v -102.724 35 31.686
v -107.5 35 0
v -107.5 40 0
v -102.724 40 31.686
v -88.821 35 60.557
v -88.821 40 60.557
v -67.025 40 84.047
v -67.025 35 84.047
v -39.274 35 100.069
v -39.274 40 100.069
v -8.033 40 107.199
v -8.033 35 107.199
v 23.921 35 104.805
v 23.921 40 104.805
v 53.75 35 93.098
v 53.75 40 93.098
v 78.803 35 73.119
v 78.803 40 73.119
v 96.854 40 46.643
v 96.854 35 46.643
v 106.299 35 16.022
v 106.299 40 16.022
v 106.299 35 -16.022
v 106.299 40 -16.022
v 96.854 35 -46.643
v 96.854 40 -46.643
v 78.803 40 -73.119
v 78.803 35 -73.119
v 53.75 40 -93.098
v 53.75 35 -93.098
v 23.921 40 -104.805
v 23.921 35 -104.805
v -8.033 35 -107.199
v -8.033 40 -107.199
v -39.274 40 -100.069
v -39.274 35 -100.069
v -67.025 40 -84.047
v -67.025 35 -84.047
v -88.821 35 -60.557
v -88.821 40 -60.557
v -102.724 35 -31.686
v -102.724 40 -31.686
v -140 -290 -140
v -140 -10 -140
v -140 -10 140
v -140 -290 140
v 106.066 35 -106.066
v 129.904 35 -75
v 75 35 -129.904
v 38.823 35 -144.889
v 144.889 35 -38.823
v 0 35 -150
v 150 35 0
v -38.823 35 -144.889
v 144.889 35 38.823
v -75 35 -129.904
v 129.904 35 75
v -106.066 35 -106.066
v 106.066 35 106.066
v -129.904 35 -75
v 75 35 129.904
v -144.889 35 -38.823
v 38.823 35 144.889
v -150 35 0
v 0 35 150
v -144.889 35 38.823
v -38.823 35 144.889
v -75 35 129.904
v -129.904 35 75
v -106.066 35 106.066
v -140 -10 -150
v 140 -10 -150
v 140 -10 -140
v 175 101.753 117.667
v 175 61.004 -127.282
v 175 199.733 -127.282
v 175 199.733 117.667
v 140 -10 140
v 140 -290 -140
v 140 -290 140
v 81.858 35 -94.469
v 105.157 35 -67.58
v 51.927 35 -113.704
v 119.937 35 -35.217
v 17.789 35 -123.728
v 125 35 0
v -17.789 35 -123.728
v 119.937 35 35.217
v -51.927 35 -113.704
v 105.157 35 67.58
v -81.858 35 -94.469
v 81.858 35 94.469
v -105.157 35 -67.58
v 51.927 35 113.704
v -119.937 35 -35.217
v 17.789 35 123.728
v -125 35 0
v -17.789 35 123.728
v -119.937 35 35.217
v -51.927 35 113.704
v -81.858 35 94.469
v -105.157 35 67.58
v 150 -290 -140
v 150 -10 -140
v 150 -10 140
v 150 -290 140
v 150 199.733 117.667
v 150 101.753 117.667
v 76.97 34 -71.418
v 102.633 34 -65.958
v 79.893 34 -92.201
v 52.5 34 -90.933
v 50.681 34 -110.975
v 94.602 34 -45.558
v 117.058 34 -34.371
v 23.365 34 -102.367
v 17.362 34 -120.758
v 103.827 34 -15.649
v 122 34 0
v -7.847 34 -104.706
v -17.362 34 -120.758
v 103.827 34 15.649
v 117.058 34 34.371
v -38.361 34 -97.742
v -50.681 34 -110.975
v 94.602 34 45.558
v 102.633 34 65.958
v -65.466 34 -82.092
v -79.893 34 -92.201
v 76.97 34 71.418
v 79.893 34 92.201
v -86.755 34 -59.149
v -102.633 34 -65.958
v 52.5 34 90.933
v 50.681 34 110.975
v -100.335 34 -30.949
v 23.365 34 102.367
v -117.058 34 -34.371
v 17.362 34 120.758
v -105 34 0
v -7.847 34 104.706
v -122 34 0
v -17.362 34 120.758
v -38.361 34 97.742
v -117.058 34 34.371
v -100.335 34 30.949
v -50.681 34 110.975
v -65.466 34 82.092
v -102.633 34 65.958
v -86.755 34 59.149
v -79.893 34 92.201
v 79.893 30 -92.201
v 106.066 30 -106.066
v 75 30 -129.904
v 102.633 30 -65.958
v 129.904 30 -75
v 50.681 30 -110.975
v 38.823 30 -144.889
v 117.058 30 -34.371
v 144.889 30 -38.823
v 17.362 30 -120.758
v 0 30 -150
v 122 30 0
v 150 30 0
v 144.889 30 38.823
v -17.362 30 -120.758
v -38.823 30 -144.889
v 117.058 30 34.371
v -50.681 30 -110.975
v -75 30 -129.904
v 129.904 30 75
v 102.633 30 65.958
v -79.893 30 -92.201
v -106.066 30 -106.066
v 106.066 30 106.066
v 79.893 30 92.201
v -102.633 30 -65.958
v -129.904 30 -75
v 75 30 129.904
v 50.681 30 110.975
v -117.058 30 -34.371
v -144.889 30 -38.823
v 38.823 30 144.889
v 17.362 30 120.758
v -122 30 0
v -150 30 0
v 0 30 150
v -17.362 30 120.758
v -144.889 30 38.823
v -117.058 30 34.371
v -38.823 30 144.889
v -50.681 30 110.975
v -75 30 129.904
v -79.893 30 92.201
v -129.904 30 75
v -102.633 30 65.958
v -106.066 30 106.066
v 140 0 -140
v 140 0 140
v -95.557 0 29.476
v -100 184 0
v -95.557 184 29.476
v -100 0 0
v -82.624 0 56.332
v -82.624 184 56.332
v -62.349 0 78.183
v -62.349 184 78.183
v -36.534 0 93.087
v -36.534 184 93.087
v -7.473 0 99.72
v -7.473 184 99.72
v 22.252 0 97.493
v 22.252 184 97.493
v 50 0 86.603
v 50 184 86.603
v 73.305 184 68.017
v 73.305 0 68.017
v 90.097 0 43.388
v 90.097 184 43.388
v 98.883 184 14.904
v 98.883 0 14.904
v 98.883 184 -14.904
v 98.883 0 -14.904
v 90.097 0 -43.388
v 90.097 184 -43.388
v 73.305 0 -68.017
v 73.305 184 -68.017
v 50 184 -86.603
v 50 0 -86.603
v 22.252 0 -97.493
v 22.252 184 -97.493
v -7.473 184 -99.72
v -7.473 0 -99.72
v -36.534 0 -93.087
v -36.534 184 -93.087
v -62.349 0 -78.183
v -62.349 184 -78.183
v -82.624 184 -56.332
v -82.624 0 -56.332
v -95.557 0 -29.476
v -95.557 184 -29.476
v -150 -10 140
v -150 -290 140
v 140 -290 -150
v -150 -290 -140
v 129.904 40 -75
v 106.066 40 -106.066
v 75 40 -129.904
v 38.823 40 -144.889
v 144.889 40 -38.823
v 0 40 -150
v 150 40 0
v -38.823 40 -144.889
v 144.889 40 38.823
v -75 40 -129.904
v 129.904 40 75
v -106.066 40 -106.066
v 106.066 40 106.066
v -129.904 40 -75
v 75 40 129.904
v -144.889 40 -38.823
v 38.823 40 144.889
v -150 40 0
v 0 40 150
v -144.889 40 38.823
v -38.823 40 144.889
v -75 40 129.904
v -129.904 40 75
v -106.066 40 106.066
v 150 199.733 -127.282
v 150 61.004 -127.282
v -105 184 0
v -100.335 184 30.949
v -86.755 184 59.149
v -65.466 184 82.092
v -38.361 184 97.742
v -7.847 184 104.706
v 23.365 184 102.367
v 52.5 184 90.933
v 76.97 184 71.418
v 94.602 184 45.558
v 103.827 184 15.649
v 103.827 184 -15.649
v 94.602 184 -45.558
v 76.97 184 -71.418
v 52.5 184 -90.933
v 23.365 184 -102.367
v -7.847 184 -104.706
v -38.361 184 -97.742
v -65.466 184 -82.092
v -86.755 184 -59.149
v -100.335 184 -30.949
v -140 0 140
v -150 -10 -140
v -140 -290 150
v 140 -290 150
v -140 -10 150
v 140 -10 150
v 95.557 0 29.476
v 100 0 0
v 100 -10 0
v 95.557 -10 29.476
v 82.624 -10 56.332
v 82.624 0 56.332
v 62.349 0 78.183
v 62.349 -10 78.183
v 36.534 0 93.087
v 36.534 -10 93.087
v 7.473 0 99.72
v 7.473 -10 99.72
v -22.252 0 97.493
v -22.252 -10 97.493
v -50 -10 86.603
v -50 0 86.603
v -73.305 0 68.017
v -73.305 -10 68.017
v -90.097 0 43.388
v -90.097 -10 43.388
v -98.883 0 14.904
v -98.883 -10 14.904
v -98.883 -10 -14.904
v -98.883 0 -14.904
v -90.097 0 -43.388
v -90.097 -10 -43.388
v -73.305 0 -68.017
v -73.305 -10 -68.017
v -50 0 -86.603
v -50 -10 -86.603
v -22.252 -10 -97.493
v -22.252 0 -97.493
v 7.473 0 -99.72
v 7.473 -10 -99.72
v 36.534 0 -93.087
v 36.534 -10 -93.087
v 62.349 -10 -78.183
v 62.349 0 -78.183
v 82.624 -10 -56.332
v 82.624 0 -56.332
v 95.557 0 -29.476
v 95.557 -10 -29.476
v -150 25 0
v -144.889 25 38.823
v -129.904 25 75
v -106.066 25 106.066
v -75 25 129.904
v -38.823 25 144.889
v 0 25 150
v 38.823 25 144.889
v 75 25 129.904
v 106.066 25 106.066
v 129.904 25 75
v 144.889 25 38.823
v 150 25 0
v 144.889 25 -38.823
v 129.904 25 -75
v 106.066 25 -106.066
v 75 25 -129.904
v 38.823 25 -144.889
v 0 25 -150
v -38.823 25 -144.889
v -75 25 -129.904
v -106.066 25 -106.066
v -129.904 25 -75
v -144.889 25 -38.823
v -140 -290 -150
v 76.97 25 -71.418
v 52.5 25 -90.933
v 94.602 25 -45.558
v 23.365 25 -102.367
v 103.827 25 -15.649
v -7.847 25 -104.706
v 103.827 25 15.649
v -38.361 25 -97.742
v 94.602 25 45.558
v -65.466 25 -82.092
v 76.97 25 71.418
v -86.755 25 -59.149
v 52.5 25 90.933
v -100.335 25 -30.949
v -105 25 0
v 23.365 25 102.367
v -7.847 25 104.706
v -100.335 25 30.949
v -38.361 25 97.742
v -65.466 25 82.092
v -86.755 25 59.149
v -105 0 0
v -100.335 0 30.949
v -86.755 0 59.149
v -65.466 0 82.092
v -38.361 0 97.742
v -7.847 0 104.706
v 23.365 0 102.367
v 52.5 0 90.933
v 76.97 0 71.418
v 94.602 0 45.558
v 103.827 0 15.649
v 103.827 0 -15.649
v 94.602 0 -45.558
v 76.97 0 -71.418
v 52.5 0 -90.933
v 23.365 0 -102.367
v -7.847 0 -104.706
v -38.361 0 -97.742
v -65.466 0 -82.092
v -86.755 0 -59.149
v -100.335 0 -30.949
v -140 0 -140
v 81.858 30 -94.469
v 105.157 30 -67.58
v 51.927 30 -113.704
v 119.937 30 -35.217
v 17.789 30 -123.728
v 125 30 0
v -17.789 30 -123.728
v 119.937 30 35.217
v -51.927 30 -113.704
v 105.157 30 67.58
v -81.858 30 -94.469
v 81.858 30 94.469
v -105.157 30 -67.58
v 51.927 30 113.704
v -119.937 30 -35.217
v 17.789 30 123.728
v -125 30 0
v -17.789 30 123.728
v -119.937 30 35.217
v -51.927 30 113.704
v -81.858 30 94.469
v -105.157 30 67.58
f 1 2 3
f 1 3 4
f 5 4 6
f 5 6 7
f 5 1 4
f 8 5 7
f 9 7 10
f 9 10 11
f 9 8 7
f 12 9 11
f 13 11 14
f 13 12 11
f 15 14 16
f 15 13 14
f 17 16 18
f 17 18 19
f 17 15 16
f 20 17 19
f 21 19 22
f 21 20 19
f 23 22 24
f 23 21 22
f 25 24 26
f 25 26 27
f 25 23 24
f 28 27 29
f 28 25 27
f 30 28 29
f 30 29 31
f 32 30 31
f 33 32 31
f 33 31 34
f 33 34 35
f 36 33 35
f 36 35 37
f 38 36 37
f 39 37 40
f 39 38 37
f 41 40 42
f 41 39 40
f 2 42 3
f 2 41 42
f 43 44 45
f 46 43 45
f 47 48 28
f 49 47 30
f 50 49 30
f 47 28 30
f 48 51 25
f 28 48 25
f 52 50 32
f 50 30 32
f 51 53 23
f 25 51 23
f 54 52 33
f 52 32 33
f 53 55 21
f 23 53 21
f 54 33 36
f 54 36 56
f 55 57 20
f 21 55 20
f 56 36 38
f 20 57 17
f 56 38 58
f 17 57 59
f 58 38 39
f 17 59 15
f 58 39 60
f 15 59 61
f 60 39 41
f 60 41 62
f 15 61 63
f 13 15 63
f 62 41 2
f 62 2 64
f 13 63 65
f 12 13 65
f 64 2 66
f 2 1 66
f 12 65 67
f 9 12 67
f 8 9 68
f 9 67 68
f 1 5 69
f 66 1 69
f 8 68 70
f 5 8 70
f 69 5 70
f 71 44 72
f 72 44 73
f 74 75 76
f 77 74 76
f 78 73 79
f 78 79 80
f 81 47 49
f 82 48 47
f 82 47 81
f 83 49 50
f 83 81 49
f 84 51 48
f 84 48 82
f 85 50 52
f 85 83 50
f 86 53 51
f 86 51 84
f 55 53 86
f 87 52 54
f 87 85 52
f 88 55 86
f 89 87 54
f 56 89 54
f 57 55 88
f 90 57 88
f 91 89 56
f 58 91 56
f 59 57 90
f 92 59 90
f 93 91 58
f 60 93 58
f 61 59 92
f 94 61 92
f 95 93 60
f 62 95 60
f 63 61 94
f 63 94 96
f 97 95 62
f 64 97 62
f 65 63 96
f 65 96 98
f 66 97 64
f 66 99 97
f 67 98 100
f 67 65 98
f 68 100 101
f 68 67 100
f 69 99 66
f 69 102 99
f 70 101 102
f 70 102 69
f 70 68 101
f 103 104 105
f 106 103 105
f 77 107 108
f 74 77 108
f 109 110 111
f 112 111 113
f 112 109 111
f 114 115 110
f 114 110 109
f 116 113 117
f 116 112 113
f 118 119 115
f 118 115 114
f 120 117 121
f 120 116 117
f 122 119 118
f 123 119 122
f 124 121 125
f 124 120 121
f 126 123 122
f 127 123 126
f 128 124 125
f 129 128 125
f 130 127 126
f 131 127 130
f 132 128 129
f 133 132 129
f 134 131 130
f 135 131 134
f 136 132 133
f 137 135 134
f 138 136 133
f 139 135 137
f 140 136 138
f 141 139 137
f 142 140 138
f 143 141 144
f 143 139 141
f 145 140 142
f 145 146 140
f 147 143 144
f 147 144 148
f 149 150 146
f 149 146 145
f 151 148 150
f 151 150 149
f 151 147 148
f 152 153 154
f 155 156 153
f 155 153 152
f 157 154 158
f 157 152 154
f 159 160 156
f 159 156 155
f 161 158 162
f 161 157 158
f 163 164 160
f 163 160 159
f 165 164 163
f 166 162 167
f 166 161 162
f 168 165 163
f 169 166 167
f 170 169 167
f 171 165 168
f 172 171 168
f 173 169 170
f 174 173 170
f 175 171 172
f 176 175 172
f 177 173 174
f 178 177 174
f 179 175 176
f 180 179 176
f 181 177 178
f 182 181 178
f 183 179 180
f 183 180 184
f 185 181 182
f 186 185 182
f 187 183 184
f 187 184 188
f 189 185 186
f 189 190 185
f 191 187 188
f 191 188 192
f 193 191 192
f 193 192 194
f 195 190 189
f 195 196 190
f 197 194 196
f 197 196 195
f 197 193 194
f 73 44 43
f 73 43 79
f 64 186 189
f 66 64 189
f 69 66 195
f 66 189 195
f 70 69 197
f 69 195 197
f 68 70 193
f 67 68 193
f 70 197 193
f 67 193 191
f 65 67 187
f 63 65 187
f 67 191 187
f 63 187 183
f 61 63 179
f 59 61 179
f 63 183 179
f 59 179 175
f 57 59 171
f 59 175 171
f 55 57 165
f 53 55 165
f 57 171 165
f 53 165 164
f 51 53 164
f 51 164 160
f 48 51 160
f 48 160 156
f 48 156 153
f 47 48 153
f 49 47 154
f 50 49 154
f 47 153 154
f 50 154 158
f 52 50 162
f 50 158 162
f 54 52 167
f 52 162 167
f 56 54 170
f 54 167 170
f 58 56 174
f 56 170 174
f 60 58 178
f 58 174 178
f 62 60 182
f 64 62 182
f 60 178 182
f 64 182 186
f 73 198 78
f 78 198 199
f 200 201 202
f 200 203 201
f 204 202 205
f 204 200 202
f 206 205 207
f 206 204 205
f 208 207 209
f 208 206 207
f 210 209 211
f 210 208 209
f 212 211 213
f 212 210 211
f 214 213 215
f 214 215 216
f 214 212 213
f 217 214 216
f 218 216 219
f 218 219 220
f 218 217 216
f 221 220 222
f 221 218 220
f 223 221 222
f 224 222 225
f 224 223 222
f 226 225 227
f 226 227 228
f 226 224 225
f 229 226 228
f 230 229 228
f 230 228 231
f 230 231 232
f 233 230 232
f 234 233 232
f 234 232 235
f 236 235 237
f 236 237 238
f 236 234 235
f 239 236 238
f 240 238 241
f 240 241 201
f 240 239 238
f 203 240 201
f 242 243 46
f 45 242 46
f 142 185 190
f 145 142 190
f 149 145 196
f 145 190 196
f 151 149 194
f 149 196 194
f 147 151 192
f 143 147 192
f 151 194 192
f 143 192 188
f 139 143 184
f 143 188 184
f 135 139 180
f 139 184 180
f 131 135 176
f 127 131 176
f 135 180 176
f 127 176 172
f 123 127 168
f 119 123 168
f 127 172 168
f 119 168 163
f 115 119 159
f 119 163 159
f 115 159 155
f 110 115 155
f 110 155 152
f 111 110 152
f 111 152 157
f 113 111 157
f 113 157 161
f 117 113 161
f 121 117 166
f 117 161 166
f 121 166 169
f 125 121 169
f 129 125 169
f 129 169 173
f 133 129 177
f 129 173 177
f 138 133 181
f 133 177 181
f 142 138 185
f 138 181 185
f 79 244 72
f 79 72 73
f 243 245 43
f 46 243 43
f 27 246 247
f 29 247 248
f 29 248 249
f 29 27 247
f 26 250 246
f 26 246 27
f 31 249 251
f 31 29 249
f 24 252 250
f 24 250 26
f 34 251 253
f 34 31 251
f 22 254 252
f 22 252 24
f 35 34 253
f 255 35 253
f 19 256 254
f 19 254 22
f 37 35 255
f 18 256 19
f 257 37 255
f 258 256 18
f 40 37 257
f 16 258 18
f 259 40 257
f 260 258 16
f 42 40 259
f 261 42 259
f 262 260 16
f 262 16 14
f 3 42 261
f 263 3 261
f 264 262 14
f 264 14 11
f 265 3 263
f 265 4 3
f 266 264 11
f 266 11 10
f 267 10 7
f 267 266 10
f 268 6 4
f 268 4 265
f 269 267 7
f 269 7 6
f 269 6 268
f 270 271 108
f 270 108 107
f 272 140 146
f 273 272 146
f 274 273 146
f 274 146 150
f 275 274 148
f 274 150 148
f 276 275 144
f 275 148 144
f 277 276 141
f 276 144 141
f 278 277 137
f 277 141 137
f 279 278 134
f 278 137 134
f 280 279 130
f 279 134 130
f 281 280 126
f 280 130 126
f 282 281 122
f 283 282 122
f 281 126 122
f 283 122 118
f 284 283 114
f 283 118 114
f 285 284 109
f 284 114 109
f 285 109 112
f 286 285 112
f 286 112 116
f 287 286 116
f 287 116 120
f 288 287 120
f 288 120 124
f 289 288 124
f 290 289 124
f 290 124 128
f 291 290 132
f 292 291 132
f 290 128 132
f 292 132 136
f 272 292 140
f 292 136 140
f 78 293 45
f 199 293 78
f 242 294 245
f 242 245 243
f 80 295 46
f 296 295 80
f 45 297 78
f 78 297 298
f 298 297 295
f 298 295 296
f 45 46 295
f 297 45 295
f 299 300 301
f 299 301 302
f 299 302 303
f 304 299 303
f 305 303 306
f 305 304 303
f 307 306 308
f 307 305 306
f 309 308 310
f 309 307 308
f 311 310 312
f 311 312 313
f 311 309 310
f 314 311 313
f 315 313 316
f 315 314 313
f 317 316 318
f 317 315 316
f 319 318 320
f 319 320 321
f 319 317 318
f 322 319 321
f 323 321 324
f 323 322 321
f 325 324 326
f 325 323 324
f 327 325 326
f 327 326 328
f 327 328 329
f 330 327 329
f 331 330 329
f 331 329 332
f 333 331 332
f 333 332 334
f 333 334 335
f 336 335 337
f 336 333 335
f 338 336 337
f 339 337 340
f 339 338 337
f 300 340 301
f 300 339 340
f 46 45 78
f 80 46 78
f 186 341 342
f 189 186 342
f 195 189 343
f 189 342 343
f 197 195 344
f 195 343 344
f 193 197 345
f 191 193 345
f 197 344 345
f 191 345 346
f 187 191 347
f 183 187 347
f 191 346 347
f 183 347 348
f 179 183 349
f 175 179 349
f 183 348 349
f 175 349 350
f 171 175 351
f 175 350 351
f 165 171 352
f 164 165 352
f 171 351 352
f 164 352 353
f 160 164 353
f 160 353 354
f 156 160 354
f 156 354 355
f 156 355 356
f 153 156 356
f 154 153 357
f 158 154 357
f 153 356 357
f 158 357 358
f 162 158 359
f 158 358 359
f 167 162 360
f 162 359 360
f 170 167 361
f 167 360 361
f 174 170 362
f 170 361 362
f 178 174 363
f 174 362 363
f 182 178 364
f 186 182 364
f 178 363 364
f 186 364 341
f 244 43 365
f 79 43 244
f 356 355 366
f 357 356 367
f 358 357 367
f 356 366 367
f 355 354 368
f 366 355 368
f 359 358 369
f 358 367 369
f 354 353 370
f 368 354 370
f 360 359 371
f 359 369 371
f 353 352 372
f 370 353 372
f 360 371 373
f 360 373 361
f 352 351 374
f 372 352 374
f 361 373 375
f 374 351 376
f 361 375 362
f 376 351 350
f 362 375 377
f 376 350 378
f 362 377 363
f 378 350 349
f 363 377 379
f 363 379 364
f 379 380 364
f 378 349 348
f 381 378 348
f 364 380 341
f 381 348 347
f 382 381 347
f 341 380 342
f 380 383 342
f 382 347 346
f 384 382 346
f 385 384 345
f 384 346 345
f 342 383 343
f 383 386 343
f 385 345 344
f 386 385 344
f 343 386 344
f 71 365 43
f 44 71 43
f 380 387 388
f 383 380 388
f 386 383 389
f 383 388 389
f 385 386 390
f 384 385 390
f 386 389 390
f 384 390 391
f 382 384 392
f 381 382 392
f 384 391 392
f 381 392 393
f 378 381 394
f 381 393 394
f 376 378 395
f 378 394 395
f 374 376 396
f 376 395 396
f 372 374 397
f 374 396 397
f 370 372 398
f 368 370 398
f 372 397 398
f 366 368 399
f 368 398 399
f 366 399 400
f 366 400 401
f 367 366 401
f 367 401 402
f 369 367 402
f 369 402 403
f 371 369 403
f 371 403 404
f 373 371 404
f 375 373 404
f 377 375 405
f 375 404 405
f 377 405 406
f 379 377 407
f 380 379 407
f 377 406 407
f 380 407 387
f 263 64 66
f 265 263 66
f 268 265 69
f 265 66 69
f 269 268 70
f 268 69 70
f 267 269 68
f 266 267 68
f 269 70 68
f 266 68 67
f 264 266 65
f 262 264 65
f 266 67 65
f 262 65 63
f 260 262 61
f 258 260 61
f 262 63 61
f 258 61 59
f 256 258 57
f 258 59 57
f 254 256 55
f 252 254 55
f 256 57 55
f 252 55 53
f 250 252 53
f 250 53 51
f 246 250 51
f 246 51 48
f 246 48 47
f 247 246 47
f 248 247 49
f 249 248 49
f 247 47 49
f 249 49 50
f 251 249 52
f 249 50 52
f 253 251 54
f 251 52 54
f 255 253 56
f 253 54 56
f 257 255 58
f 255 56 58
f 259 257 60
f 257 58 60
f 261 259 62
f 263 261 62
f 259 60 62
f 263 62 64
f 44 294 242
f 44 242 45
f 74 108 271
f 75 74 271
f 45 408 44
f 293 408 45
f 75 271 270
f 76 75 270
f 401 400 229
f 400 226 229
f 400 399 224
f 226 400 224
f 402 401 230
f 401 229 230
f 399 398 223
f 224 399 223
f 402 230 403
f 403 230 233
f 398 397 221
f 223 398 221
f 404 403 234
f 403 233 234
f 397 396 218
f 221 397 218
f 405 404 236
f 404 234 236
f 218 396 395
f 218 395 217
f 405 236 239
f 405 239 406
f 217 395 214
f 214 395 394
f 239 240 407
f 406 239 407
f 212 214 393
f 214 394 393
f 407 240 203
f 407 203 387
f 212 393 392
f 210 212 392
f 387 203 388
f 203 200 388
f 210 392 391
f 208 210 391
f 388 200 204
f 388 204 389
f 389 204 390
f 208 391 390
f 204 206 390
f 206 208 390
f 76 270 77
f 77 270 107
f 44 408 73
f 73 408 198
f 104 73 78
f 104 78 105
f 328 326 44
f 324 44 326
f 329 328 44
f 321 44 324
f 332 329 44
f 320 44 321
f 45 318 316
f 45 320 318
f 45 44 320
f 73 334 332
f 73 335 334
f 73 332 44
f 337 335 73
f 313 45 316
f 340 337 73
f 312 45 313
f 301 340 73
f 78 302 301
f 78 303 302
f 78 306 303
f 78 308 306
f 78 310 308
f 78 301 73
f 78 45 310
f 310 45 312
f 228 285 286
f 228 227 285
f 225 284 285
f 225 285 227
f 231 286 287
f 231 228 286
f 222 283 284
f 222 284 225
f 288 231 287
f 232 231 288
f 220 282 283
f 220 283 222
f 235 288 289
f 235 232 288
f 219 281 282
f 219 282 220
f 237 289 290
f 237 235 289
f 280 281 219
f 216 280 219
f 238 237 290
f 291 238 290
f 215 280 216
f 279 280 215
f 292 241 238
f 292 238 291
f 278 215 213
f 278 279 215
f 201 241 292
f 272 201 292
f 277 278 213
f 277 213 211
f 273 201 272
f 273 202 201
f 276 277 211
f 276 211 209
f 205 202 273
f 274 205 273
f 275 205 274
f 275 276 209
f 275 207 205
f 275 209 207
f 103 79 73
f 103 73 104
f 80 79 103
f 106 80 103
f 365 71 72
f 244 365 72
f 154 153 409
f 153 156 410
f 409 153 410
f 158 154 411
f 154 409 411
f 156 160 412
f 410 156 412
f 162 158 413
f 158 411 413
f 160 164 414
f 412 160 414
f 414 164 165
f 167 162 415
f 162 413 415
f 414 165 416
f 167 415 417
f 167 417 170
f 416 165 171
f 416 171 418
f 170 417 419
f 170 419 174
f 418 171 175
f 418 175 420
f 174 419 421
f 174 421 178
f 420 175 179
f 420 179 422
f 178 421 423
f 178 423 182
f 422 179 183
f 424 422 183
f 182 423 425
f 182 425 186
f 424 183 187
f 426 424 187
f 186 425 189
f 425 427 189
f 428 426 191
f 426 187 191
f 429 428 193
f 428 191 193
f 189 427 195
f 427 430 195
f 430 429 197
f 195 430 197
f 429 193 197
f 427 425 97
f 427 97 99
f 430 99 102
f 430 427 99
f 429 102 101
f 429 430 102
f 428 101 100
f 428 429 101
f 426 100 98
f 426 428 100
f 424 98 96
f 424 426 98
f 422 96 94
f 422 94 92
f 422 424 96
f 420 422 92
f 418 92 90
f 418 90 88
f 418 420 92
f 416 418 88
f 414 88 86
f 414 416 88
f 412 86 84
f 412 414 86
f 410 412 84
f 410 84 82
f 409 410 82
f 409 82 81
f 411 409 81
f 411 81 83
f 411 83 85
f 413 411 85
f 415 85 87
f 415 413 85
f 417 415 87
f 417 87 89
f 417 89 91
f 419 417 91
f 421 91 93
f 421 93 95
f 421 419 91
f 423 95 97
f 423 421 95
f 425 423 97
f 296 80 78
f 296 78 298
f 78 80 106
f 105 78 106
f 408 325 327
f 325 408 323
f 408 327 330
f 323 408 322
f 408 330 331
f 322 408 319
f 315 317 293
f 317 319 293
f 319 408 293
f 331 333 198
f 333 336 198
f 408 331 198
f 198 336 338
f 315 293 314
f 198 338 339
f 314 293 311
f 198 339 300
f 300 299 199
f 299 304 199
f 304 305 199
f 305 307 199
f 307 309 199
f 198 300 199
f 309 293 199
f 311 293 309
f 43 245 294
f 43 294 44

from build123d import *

# Parameters (mm, degrees)
F0_W      = 280
F0_H      = 280
F0_R      = 100
F1_DEPTH  = 10
F2_W      = 280
F2_H      = 10
F3_DEPTH  = 280
F4_W      = 10
F4_H      = 280
F5_DEPTH  = 280
F6_W      = 10
F6_H      = 280
F7_DEPTH  = 280
F8_W      = 280
F8_H      = 10
F9_DEPTH  = 280
F10_R     = 105
F10_R_2   = 100
F11_DEPTH = 25
F12_R     = 150
F12_R_2   = 100
F13_DEPTH = 5
F14_R     = 150
F14_R_2   = 125
F15_DEPTH = 5
F16_R     = 122
F16_R_2   = 100
F17_DEPTH = 4
F18_R     = 105
F18_R_2   = 100
F19_DEPTH = 150
F20_R     = 150
F20_R_2   = 107.5
F21_DEPTH = 5
F23_DEPTH = 25


with BuildPart() as f1:
    # F0 (on Front) → F1 (new body)
    with BuildSketch(Plane.XZ):
        Rectangle(F0_W, F0_H)
        Circle(F0_R, mode=Mode.SUBTRACT)
    extrude(amount=F1_DEPTH)


with BuildPart() as f3:
    # F2 (on face) → F3 (new body)
    with BuildSketch(Plane.XZ.offset(10)):
        with Locations((0, 145)):
            Rectangle(F2_W, F2_H)
    extrude(amount=F3_DEPTH)


with BuildPart() as f5:
    # F4 (on face) → F5 (new body)
    with BuildSketch(Plane.XZ.offset(10)):
        with Locations((-145, 0)):
            Rectangle(F4_W, F4_H)
    extrude(amount=F5_DEPTH)


with BuildPart() as f7:
    # F6 (on face) → F7 (new body)
    with BuildSketch(Plane.XZ.offset(10)):
        with Locations((145, 0)):
            Rectangle(F6_W, F6_H)
    extrude(amount=F7_DEPTH)


with BuildPart() as f9:
    # F8 (on face) → F9 (new body)
    with BuildSketch(Plane.XZ.offset(10)):
        with Locations((0, -145)):
            Rectangle(F8_W, F8_H)
    extrude(amount=F9_DEPTH)


with BuildPart() as f11:
    # F10 (on face) → F11 (new body)
    with BuildSketch(Plane(origin=(0, 0, 0), x_dir=(-1, 0, 0), z_dir=(0, 1, 0))):
        Circle(F10_R)
        Circle(F10_R_2, mode=Mode.SUBTRACT)
    extrude(amount=F11_DEPTH)

    # F12 (on face) → F13 (join)
    with BuildSketch(Plane(origin=(0, 25, 0), x_dir=(-1, 0, 0), z_dir=(0, 1, 0))):
        Circle(F12_R)
        Circle(F12_R_2, mode=Mode.SUBTRACT)
    extrude(amount=F13_DEPTH)

    # F16 (on face) → F17 (join)
    with BuildSketch(Plane(origin=(0, 30, 0), x_dir=(-1, 0, 0), z_dir=(0, 1, 0))):
        Circle(F16_R)
        Circle(F16_R_2, mode=Mode.SUBTRACT)
    extrude(amount=F17_DEPTH)

    # F18 (on face) → F19 (join)
    with BuildSketch(Plane(origin=(0, 34, 0), x_dir=(-1, 0, 0), z_dir=(0, 1, 0))):
        Circle(F18_R)
        Circle(F18_R_2, mode=Mode.SUBTRACT)
    extrude(amount=F19_DEPTH)


with BuildPart() as f15:
    # F14 (on face) → F15 (new body)
    with BuildSketch(Plane(origin=(0, 30, 0), x_dir=(-1, 0, 0), z_dir=(0, 1, 0))):
        Circle(F14_R)
        Circle(F14_R_2, mode=Mode.SUBTRACT)
    extrude(amount=F15_DEPTH)


with BuildPart() as f21:
    # F20 (on face) → F21 (new body)
    with BuildSketch(Plane(origin=(0, 35, 0), x_dir=(-1, 0, 0), z_dir=(0, 1, 0))):
        Circle(F20_R)
        Circle(F20_R_2, mode=Mode.SUBTRACT)
    extrude(amount=F21_DEPTH)


with BuildPart() as f23:
    # F22 (on face) → F23 (new body)
    with BuildSketch(Plane.YZ.offset(150)):
        Polygon((199.7325718403, 117.6671534777), (101.7529219389, 117.6671534777), (61.0043779016, -127.2819787264), (199.7325718403, -127.2819787264), align=None)
    extrude(amount=F23_DEPTH)


solid = Compound([f1.part, f3.part, f5.part, f7.part, f9.part, f11.part, f15.part, f21.part, f23.part])
